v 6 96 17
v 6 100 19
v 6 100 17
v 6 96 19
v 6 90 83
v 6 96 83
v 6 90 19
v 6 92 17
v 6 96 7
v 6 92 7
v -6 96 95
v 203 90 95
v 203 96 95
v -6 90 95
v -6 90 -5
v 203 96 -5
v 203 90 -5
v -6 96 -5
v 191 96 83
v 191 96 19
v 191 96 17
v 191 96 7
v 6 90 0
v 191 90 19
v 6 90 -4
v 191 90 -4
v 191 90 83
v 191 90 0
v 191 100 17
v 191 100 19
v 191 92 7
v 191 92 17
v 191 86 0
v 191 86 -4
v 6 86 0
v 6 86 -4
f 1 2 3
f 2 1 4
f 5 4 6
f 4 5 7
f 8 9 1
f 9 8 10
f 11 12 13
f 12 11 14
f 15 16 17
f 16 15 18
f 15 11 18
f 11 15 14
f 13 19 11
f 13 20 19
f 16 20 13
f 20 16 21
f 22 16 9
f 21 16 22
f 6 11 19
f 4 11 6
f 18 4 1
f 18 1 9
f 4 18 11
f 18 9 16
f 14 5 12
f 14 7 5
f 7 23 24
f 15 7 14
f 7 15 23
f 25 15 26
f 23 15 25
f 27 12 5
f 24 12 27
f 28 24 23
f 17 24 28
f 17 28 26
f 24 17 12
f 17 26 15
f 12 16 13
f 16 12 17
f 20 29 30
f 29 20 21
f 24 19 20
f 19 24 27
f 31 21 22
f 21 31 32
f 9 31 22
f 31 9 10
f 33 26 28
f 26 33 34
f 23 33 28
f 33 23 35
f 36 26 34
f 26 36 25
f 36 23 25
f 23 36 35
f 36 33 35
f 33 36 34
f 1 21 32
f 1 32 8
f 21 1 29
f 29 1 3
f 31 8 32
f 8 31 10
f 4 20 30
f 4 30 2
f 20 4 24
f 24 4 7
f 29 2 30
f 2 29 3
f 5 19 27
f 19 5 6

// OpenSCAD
$fn=4;

lattenrost_laenge=197;
lattenrost_breite=90;
lattenrost_hoehe=10;
matratzen_hoehe=15;
sitz_hoehe=100;
balken_vertikal_breite=12;
balken_vertikal_tiefe=6;
balken_horizontal_hoehe=12;
balken_horizontal_tiefe=6;

module matratze() {
  translate([0,0,0]) cube([lattenrost_laenge,lattenrost_breite,lattenrost_hoehe]);
  translate([0,0,lattenrost_hoehe]) cube([lattenrost_laenge,lattenrost_breite,matratzen_hoehe]);
}

module seite_links() {
  translate([-6,-6,-5]) cube([12,6,100]);
  translate([lattenrost_laenge-12+6,-6,-5]) cube([12,6,100]);
  translate([6,-6,-5]) cube([lattenrost_laenge-(6+6),6,12]);
  translate([6,0,-4]) cube([lattenrost_laenge-(6+6),4,4]);
  translate([6,-6,100-12-5]) cube([lattenrost_laenge-(6+6),6,12]);
  translate([6,-4,7]) cube([lattenrost_laenge-(6+6),2,10]);
}

module explode() {
echo( $children);
  for (i=[0:1:$children-1])

   translate([i*20,0,i*2]) { 
		children(i); 
    echo( i);
	}
}

module seite_rechts() {
  translate([0,lattenrost_breite,0]) {
    translate([-6,0,-5]) cube([12,6,100]);
    translate([lattenrost_laenge-12+6,0,-5]) cube([12,6,100]);
    translate([6,0,-5]) cube([lattenrost_laenge-(6+6),6,12]);
    translate([6,0-4,-4]) cube([lattenrost_laenge-(6+6),4,4]);
    translate([6,0,7]) cube([lattenrost_laenge-(6+6),2,10]);
    translate([6,0,17]) cube([lattenrost_laenge-(6+6),10,2]);
    translate([6,0,100-12-5]) cube([lattenrost_laenge-(6+6),6,12]);
  }
}

module kopf_ende() {
  translate([-6,0,-5]) cube([6,lattenrost_breite,12]);
  translate([-6,0,100-12-5]) cube([6,lattenrost_breite,12]);
}

module fuss_ende() {
  translate([lattenrost_laenge,0,-5]) cube([6,lattenrost_breite,12]);
  translate([lattenrost_laenge,0,100-12-5]) cube([6,lattenrost_breite,12]);
}

* % matratze();
*seite_links();
/* explode() { */
  seite_rechts();
/* } */
*kopf_ende();
*fuss_ende();
